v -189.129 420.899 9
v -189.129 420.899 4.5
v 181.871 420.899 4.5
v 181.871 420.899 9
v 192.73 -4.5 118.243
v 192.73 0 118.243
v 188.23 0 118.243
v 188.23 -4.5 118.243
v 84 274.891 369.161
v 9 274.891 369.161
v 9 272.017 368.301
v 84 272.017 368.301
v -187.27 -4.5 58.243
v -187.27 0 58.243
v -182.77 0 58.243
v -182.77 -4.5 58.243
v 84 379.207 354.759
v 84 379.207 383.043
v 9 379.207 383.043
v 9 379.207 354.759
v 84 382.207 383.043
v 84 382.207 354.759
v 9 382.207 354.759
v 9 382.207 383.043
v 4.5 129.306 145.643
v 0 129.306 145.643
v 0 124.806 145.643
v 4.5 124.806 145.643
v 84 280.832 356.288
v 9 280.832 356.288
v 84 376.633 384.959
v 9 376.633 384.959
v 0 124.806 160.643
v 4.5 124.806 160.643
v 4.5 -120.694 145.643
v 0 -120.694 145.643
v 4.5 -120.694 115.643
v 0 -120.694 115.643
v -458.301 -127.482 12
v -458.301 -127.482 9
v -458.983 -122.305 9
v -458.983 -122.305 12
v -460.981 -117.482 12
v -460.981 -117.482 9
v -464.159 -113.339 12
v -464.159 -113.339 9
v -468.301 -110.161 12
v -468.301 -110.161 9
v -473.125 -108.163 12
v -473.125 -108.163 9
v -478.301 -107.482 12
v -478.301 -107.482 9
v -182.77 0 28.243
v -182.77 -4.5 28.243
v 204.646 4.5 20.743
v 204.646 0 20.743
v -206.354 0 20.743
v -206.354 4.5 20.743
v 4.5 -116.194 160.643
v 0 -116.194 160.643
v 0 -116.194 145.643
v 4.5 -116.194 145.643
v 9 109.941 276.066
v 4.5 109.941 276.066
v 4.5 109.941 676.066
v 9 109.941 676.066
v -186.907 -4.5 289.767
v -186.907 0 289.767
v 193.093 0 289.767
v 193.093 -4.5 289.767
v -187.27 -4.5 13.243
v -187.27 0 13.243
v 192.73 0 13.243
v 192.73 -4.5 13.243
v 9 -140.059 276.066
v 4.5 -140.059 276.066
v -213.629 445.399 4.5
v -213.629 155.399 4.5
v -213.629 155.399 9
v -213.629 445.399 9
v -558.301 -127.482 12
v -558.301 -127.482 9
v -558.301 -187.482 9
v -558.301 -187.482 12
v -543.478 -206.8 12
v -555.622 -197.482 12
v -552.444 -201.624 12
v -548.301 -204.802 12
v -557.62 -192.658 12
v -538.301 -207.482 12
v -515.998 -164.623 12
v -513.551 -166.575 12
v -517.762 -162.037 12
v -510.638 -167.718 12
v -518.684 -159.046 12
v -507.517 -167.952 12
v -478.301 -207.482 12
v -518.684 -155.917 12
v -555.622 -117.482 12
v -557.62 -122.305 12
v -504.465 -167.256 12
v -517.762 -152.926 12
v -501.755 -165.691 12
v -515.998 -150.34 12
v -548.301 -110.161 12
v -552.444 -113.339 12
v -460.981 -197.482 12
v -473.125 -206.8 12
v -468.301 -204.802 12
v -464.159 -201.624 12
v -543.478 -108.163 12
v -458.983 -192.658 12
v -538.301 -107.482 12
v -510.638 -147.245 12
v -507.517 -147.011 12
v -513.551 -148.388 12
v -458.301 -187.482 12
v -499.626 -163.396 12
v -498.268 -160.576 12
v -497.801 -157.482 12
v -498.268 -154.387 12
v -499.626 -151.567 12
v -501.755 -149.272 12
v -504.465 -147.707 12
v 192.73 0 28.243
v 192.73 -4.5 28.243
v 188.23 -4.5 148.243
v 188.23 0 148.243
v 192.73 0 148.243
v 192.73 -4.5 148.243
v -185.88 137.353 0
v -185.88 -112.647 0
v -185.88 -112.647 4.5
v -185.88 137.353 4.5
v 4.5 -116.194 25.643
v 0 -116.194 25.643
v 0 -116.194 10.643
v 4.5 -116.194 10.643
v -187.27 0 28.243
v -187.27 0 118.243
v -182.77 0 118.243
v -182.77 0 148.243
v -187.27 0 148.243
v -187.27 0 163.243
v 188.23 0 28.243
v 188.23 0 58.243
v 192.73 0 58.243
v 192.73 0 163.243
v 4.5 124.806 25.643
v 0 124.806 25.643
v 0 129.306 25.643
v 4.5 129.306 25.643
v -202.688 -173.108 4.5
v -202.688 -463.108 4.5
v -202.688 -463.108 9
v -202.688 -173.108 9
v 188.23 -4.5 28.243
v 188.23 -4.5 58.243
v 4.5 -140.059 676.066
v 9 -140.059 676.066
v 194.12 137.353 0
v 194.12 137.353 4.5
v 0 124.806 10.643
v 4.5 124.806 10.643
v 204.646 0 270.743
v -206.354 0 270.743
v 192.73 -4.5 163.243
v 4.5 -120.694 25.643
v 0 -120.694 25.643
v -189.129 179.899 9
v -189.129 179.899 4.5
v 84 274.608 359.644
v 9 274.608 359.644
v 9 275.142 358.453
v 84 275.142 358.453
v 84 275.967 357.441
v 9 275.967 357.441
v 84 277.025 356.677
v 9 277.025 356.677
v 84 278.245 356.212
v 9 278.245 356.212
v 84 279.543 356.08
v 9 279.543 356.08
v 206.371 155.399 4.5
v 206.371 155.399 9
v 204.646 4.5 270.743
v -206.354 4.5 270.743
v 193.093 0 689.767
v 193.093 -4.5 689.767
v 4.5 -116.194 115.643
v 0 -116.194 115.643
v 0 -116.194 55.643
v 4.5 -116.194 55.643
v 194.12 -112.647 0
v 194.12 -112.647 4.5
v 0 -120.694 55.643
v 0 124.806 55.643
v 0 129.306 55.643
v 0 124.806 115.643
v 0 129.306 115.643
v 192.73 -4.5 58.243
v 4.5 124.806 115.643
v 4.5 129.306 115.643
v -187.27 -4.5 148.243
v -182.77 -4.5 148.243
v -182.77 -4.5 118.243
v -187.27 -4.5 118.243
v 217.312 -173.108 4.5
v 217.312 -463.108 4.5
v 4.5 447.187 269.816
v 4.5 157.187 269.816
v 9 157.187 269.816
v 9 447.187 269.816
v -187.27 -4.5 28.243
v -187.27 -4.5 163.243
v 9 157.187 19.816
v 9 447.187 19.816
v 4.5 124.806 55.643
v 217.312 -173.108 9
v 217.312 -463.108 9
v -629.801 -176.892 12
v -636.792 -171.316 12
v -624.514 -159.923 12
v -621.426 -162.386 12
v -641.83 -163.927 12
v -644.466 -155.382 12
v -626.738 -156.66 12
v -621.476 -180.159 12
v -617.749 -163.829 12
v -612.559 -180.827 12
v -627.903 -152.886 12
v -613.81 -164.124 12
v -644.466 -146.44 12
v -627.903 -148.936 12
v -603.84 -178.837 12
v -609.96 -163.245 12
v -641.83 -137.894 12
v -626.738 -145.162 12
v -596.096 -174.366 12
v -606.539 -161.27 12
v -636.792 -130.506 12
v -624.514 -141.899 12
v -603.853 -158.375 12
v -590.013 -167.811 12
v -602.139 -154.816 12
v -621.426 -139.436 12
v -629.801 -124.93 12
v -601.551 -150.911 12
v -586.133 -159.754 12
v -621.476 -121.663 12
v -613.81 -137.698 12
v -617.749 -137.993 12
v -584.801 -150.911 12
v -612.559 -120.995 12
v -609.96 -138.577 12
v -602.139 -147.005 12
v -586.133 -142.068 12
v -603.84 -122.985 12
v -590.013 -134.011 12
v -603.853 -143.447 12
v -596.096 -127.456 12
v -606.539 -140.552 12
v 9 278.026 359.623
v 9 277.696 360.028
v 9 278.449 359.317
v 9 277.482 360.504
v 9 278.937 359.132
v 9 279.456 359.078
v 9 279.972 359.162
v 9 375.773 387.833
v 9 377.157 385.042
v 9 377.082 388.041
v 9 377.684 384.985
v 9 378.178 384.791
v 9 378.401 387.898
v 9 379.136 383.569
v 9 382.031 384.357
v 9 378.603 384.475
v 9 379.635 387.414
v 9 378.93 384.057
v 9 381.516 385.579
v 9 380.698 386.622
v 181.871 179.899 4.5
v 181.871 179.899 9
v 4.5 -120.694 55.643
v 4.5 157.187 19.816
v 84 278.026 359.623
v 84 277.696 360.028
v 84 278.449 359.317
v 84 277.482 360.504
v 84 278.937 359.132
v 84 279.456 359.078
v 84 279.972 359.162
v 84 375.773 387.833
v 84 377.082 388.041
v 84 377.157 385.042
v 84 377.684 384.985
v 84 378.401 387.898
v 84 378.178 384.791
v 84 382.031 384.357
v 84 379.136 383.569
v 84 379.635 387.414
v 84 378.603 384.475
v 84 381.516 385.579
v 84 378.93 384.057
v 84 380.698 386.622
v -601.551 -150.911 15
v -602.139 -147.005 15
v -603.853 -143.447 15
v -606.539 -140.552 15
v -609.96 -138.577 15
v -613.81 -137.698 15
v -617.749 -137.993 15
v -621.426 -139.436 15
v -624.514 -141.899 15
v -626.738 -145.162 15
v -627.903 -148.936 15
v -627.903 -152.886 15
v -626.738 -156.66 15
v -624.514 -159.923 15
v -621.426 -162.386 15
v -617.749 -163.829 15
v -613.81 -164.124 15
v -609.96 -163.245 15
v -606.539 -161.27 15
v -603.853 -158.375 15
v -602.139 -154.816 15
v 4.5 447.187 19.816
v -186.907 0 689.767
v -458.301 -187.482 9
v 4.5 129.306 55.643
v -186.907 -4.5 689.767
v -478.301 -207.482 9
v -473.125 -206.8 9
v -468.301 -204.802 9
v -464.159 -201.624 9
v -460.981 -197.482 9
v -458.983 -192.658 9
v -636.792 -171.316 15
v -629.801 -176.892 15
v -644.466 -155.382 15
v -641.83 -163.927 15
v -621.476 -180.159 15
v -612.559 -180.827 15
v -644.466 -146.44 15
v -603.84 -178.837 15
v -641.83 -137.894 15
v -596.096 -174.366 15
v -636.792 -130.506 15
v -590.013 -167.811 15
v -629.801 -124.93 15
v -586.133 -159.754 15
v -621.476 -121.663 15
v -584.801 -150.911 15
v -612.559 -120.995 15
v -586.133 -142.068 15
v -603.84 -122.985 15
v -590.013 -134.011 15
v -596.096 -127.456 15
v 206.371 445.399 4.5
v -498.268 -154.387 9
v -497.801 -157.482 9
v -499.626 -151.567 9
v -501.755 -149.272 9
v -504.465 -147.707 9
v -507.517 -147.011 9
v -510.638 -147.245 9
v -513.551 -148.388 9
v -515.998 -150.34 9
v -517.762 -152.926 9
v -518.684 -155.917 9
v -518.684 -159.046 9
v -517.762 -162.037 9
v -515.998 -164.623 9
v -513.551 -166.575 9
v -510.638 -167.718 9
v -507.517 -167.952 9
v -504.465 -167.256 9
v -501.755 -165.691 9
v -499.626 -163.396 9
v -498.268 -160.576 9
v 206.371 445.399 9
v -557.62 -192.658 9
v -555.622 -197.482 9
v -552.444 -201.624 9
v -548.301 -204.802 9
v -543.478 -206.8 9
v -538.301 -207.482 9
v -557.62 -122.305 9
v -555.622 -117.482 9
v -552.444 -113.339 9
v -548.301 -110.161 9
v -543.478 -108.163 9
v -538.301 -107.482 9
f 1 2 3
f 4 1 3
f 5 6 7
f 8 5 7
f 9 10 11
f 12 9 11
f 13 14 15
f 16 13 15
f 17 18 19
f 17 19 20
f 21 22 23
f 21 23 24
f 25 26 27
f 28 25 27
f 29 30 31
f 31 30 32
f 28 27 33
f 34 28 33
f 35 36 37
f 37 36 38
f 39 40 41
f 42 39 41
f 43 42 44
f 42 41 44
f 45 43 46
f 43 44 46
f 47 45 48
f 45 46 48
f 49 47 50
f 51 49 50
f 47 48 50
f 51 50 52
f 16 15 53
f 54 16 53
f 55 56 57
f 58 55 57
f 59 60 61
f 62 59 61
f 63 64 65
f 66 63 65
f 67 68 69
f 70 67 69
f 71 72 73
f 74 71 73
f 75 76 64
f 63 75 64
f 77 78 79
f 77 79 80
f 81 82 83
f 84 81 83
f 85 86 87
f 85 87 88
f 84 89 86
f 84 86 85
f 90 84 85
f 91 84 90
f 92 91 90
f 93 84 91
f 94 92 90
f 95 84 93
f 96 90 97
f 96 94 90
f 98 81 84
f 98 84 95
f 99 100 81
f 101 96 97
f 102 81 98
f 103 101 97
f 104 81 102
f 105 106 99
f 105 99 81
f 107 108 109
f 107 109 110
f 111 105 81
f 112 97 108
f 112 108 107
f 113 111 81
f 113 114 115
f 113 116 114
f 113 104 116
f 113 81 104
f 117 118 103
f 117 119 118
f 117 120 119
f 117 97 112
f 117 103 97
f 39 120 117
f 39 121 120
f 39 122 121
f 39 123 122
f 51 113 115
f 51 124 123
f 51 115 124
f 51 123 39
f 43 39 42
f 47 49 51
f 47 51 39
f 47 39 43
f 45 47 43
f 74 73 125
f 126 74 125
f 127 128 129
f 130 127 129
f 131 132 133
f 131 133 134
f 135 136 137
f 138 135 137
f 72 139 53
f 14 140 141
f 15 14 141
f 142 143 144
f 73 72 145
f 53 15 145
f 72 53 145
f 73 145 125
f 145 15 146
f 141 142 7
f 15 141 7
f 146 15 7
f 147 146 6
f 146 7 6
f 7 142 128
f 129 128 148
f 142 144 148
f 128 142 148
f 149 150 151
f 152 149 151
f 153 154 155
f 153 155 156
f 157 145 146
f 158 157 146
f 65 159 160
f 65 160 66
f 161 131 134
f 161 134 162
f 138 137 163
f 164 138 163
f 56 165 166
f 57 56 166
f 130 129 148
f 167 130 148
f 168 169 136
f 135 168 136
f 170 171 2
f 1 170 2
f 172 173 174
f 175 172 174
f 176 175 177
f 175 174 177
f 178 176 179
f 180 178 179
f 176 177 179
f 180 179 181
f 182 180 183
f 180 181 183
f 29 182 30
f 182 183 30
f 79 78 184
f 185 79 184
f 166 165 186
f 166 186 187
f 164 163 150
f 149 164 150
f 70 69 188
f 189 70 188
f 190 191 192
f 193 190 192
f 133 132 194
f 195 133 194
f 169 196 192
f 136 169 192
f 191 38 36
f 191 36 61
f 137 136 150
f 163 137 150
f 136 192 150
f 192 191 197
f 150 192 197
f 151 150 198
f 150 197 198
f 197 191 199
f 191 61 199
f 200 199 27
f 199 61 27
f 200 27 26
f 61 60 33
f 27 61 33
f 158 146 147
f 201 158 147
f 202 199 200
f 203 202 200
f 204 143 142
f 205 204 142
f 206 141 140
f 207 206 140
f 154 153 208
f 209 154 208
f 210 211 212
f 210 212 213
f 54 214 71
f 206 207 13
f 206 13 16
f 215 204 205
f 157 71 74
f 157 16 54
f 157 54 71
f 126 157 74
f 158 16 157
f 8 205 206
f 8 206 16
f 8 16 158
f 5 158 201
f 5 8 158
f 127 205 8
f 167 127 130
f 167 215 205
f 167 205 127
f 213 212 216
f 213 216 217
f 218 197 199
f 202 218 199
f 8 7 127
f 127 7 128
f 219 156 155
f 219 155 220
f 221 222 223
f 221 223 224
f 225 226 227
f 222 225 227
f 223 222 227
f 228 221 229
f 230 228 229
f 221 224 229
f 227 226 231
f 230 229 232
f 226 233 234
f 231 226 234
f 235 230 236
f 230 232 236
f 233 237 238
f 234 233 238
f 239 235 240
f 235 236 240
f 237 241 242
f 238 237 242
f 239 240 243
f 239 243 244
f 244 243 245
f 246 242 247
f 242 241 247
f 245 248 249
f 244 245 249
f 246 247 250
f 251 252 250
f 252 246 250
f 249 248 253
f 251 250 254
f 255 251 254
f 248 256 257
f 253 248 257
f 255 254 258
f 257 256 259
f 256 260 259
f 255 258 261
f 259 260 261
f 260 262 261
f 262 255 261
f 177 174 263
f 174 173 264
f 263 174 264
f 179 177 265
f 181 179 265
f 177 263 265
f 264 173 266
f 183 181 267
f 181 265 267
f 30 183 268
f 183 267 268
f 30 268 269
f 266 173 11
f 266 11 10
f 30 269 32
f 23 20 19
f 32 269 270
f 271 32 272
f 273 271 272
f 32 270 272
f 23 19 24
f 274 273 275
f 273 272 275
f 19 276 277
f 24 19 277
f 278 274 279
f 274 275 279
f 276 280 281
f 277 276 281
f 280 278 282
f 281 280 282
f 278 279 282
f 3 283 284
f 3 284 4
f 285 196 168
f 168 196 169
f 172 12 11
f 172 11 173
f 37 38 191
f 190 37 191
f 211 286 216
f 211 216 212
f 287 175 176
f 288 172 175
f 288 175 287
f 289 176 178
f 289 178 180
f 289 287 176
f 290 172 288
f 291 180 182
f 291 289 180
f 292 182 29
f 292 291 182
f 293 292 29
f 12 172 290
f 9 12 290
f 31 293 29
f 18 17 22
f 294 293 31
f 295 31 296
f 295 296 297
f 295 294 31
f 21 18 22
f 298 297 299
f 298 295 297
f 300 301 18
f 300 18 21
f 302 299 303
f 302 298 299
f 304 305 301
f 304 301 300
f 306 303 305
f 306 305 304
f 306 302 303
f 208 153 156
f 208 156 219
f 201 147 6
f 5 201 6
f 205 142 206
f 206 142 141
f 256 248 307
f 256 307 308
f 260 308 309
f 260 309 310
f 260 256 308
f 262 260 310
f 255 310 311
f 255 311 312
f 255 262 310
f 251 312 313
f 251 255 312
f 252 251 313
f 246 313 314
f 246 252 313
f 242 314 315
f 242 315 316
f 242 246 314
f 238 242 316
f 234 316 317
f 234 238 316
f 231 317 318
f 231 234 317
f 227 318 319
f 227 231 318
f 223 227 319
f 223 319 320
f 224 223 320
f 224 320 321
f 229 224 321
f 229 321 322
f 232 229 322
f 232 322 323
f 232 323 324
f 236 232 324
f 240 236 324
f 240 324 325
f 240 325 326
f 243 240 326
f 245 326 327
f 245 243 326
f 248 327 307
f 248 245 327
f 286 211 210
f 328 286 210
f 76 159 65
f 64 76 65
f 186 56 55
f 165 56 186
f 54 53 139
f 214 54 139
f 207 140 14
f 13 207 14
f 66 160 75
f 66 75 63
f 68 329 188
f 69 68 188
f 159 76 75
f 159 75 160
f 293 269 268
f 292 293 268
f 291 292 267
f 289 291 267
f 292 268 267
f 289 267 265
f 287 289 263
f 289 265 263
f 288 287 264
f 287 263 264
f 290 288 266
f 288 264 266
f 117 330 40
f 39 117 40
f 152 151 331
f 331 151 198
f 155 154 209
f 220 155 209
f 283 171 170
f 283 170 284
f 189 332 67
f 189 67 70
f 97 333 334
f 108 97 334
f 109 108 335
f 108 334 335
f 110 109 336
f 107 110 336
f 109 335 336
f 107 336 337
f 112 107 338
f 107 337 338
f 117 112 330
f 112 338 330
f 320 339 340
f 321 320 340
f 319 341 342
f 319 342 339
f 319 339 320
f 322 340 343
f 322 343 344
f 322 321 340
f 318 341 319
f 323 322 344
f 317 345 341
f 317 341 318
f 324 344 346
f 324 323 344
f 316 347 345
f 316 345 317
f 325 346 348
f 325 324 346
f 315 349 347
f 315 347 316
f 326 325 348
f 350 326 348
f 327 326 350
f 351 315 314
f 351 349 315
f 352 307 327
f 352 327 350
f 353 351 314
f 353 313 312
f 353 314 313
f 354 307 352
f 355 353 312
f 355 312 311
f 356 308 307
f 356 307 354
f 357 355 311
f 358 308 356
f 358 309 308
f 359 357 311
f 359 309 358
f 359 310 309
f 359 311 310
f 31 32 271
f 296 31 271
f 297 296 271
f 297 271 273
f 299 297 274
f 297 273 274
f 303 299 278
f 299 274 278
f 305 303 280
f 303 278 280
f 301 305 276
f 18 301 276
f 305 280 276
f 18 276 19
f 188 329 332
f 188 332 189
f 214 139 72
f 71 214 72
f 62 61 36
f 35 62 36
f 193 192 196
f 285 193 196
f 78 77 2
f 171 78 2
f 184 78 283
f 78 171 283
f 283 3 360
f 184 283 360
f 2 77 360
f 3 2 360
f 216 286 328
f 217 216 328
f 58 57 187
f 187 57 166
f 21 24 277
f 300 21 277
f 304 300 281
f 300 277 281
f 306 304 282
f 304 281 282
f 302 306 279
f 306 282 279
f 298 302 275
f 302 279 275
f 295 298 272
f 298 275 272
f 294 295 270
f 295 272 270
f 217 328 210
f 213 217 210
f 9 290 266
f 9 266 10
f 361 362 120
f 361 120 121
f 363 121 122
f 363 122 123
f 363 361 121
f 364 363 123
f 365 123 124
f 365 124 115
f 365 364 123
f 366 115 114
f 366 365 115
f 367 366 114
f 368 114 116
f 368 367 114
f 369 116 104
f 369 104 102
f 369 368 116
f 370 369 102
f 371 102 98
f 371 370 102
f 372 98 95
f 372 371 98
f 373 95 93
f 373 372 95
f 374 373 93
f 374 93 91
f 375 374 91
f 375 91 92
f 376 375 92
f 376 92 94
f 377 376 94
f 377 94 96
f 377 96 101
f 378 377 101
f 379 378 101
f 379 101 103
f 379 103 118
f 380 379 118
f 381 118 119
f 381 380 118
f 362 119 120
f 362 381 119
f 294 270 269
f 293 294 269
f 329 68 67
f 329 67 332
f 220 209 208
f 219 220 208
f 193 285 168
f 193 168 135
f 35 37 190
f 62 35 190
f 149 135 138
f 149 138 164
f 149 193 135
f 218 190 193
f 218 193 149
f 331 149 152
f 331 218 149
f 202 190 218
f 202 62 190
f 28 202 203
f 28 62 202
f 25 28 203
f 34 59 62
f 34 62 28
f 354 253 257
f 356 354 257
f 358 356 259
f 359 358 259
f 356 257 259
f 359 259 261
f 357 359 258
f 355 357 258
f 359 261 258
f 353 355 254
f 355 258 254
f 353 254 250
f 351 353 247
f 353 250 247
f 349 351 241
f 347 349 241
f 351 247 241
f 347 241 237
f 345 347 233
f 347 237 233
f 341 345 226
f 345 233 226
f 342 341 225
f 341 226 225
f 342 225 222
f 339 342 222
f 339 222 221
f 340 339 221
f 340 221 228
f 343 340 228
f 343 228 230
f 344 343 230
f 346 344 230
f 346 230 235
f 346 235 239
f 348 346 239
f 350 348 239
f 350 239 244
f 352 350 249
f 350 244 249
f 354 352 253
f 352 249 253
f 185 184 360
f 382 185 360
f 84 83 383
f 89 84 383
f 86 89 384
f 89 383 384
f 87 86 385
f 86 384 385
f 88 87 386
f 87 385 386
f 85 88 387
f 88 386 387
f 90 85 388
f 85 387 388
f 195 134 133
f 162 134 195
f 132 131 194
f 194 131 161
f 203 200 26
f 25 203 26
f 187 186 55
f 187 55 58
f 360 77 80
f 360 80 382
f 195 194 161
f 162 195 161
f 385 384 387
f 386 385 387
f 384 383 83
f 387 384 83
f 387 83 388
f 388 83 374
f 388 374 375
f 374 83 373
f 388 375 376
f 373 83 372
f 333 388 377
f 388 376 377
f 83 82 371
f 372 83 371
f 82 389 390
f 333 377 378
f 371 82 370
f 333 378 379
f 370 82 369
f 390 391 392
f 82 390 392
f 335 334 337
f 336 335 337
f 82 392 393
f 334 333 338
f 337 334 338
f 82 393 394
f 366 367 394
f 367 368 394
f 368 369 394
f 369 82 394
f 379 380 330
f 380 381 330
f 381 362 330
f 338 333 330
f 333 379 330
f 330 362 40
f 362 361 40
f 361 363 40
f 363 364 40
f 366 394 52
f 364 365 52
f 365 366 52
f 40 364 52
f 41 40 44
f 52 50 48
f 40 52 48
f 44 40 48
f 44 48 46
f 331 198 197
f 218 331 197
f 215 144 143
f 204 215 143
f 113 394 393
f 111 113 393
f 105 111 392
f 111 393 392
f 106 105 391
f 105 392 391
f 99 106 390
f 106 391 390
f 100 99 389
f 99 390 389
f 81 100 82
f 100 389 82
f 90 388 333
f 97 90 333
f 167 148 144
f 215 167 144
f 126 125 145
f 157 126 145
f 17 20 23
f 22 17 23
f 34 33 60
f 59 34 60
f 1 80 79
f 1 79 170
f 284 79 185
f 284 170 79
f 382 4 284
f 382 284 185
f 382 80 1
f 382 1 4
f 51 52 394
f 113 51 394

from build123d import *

# Parameters (mm, degrees)
F0_W      = 380
F0_H      = 250
F1_DEPTH  = 4.5
F3_DEPTH  = 4.5
F5_DEPTH  = 4.5
F6_W      = 420
F6_H      = 290
F6_W_2    = 371
F6_H_2    = 241
F7_DEPTH  = 4.5
F8_W      = 290
F8_H      = 250
F9_DEPTH  = 4.5
F10_W     = 411
F10_H     = 250
F11_DEPTH = 4.5
F12_W     = 420
F12_H     = 290
F13_DEPTH = 4.5
F14_W     = 380
F14_H     = 400
F15_DEPTH = 4.5
F16_W     = 250
F16_H     = 400
F17_DEPTH = 4.5
F19_DEPTH = 75
F20_R     = 10.5
F21_DEPTH = 3
F22_R     = 30
F22_R_2   = 13.25
F23_DEPTH = 3


with BuildPart() as f1:
    # F0 (on Top) → F1 (new body)
    with BuildSketch(Plane.XY):
        with Locations((4.120028, 12.352592)):
            Rectangle(F0_W, F0_H)
    extrude(amount=F1_DEPTH)


with BuildPart() as f3:
    # F2 (on Front) → F3 (new body)
    with BuildSketch(Plane.XZ):
        Polygon((-187.26966, 28.243211), (-187.26966, 13.243211), (192.73034, 13.243211), (192.73034, 28.243211), (188.23034, 28.243211), (188.23034, 58.243211), (192.73034, 58.243211), (192.73034, 118.243211), (188.23034, 118.243211), (188.23034, 148.243211), (192.73034, 148.243211), (192.73034, 163.243211), (-187.26966, 163.243211), (-187.26966, 148.243211), (-182.76966, 148.243211), (-182.76966, 118.243211), (-187.26966, 118.243211), (-187.26966, 58.243211), (-182.76966, 58.243211), (-182.76966, 28.243211), align=None)
    extrude(amount=F3_DEPTH)


with BuildPart() as f5:
    # F4 (on Right) → F5 (new body)
    with BuildSketch(Plane.YZ):
        Polygon((-116.194034, 25.642902), (-116.194034, 10.642902), (124.805966, 10.642902), (124.805966, 25.642902), (129.305966, 25.642902), (129.305966, 55.642902), (124.805966, 55.642902), (124.805966, 115.642902), (129.305966, 115.642902), (129.305966, 145.642902), (124.805966, 145.642902), (124.805966, 160.642902), (-116.194034, 160.642902), (-116.194034, 145.642902), (-120.694034, 145.642902), (-120.694034, 115.642902), (-116.194034, 115.642902), (-116.194034, 55.642902), (-120.694034, 55.642902), (-120.694034, 25.642902), align=None)
    extrude(amount=F5_DEPTH)


with BuildPart() as f7:
    # F6 (on face) → F7 (new body)
    with BuildSketch(Plane.XY.offset(4.5)):
        with Locations((-3.628729, 300.398995)):
            Rectangle(F6_W, F6_H)
        with Locations((-3.628729, 300.398995)):
            Rectangle(F6_W_2, F6_H_2, mode=Mode.SUBTRACT)
    extrude(amount=F7_DEPTH)


with BuildPart() as f9:
    # F8 (on face) → F9 (new body)
    with BuildSketch(Plane.YZ.offset(4.5)):
        with Locations((302.186757, 144.815955)):
            Rectangle(F8_W, F8_H)
    extrude(amount=F9_DEPTH)


with BuildPart() as f11:
    # F10 (on face) → F11 (new body)
    with BuildSketch(Plane(origin=(0, 0, 0), x_dir=(-1, 0, 0), z_dir=(0, 1, 0))):
        with Locations((0.854113, 145.743211)):
            Rectangle(F10_W, F10_H)
    extrude(amount=F11_DEPTH)


with BuildPart() as f13:
    # F12 (on face) → F13 (new body)
    with BuildSketch(Plane.XY.offset(4.5)):
        with Locations((7.312002, -318.108499)):
            Rectangle(F12_W, F12_H)
    extrude(amount=F13_DEPTH)


with BuildPart() as f15:
    # F14 (on face) → F15 (new body)
    with BuildSketch(Plane.XZ):
        with Locations((3.093459, 489.766611)):
            Rectangle(F14_W, F14_H)
    extrude(amount=F15_DEPTH)


with BuildPart() as f17:
    # F16 (on face) → F17 (new body)
    with BuildSketch(Plane.YZ.offset(4.5)):
        with Locations((-15.058979, 476.066232)):
            Rectangle(F16_W, F16_H)
    extrude(amount=F17_DEPTH)


with BuildPart() as f19:
    # F18 (on face) → F19 (new body)
    with BuildSketch(Plane.YZ.offset(9)):
        with BuildLine():
            Line((379.206729, 354.758554), (382.206729, 354.758554))
            Line((382.206729, 354.758554), (382.206729, 383.04303))
            ThreePointArc((382.206729, 383.04303), (380.192705, 387.053509), (375.773151, 387.833109))
            Line((375.773151, 387.833109), (279.971575, 359.161554))
            ThreePointArc((279.971575, 359.161554), (278.448782, 359.317269), (277.482112, 360.504154))
            Line((277.482112, 360.504154), (274.891274, 369.16104))
            Line((274.891274, 369.16104), (272.017227, 368.300893))
            Line((272.017227, 368.300893), (274.608065, 359.644007))
            ThreePointArc((274.608065, 359.644007), (277.024739, 356.676795), (280.831722, 356.287506))
            Line((280.831722, 356.287506), (376.633297, 384.959062))
            ThreePointArc((376.633297, 384.959062), (378.401119, 384.647222), (379.206729, 383.04303))
            Line((379.206729, 383.04303), (379.206729, 354.758554))
        make_face()
    extrude(amount=F19_DEPTH)


with BuildPart() as f21:
    # F20 (on face) → F21 (new body)
    with BuildSketch(Plane.XY.offset(9)):
        with BuildLine():
            Line((-538.301447, -207.481537), (-478.301447, -207.481537))
            ThreePointArc((-478.301447, -207.481537), (-464.159311, -201.623672), (-458.301447, -187.481537))
            Line((-458.301447, -187.481537), (-458.301447, -127.481537))
            ThreePointArc((-458.301447, -127.481537), (-464.159311, -113.339401), (-478.301447, -107.481537))
            Line((-478.301447, -107.481537), (-538.301447, -107.481537))
            ThreePointArc((-538.301447, -107.481537), (-552.443582, -113.339401), (-558.301447, -127.481537))
            Line((-558.301447, -127.481537), (-558.301447, -187.481537))
            ThreePointArc((-558.301447, -187.481537), (-552.443582, -201.623672), (-538.301447, -207.481537))
        make_face()
        with Locations((-508.301447, -157.481537)):
            Circle(F20_R, mode=Mode.SUBTRACT)
    extrude(amount=F21_DEPTH)


with BuildPart() as f23:
    # F22 (on face) → F23 (new body)
    with BuildSketch(Plane.XY.offset(12)):
        with Locations((-614.800632, -150.910914)):
            Circle(F22_R)
        with Locations((-614.800632, -150.910914)):
            Circle(F22_R_2, mode=Mode.SUBTRACT)
    extrude(amount=F23_DEPTH)


solid = Compound([f1.part, f3.part, f5.part, f7.part, f9.part, f11.part, f13.part, f15.part, f17.part, f19.part, f21.part, f23.part])
